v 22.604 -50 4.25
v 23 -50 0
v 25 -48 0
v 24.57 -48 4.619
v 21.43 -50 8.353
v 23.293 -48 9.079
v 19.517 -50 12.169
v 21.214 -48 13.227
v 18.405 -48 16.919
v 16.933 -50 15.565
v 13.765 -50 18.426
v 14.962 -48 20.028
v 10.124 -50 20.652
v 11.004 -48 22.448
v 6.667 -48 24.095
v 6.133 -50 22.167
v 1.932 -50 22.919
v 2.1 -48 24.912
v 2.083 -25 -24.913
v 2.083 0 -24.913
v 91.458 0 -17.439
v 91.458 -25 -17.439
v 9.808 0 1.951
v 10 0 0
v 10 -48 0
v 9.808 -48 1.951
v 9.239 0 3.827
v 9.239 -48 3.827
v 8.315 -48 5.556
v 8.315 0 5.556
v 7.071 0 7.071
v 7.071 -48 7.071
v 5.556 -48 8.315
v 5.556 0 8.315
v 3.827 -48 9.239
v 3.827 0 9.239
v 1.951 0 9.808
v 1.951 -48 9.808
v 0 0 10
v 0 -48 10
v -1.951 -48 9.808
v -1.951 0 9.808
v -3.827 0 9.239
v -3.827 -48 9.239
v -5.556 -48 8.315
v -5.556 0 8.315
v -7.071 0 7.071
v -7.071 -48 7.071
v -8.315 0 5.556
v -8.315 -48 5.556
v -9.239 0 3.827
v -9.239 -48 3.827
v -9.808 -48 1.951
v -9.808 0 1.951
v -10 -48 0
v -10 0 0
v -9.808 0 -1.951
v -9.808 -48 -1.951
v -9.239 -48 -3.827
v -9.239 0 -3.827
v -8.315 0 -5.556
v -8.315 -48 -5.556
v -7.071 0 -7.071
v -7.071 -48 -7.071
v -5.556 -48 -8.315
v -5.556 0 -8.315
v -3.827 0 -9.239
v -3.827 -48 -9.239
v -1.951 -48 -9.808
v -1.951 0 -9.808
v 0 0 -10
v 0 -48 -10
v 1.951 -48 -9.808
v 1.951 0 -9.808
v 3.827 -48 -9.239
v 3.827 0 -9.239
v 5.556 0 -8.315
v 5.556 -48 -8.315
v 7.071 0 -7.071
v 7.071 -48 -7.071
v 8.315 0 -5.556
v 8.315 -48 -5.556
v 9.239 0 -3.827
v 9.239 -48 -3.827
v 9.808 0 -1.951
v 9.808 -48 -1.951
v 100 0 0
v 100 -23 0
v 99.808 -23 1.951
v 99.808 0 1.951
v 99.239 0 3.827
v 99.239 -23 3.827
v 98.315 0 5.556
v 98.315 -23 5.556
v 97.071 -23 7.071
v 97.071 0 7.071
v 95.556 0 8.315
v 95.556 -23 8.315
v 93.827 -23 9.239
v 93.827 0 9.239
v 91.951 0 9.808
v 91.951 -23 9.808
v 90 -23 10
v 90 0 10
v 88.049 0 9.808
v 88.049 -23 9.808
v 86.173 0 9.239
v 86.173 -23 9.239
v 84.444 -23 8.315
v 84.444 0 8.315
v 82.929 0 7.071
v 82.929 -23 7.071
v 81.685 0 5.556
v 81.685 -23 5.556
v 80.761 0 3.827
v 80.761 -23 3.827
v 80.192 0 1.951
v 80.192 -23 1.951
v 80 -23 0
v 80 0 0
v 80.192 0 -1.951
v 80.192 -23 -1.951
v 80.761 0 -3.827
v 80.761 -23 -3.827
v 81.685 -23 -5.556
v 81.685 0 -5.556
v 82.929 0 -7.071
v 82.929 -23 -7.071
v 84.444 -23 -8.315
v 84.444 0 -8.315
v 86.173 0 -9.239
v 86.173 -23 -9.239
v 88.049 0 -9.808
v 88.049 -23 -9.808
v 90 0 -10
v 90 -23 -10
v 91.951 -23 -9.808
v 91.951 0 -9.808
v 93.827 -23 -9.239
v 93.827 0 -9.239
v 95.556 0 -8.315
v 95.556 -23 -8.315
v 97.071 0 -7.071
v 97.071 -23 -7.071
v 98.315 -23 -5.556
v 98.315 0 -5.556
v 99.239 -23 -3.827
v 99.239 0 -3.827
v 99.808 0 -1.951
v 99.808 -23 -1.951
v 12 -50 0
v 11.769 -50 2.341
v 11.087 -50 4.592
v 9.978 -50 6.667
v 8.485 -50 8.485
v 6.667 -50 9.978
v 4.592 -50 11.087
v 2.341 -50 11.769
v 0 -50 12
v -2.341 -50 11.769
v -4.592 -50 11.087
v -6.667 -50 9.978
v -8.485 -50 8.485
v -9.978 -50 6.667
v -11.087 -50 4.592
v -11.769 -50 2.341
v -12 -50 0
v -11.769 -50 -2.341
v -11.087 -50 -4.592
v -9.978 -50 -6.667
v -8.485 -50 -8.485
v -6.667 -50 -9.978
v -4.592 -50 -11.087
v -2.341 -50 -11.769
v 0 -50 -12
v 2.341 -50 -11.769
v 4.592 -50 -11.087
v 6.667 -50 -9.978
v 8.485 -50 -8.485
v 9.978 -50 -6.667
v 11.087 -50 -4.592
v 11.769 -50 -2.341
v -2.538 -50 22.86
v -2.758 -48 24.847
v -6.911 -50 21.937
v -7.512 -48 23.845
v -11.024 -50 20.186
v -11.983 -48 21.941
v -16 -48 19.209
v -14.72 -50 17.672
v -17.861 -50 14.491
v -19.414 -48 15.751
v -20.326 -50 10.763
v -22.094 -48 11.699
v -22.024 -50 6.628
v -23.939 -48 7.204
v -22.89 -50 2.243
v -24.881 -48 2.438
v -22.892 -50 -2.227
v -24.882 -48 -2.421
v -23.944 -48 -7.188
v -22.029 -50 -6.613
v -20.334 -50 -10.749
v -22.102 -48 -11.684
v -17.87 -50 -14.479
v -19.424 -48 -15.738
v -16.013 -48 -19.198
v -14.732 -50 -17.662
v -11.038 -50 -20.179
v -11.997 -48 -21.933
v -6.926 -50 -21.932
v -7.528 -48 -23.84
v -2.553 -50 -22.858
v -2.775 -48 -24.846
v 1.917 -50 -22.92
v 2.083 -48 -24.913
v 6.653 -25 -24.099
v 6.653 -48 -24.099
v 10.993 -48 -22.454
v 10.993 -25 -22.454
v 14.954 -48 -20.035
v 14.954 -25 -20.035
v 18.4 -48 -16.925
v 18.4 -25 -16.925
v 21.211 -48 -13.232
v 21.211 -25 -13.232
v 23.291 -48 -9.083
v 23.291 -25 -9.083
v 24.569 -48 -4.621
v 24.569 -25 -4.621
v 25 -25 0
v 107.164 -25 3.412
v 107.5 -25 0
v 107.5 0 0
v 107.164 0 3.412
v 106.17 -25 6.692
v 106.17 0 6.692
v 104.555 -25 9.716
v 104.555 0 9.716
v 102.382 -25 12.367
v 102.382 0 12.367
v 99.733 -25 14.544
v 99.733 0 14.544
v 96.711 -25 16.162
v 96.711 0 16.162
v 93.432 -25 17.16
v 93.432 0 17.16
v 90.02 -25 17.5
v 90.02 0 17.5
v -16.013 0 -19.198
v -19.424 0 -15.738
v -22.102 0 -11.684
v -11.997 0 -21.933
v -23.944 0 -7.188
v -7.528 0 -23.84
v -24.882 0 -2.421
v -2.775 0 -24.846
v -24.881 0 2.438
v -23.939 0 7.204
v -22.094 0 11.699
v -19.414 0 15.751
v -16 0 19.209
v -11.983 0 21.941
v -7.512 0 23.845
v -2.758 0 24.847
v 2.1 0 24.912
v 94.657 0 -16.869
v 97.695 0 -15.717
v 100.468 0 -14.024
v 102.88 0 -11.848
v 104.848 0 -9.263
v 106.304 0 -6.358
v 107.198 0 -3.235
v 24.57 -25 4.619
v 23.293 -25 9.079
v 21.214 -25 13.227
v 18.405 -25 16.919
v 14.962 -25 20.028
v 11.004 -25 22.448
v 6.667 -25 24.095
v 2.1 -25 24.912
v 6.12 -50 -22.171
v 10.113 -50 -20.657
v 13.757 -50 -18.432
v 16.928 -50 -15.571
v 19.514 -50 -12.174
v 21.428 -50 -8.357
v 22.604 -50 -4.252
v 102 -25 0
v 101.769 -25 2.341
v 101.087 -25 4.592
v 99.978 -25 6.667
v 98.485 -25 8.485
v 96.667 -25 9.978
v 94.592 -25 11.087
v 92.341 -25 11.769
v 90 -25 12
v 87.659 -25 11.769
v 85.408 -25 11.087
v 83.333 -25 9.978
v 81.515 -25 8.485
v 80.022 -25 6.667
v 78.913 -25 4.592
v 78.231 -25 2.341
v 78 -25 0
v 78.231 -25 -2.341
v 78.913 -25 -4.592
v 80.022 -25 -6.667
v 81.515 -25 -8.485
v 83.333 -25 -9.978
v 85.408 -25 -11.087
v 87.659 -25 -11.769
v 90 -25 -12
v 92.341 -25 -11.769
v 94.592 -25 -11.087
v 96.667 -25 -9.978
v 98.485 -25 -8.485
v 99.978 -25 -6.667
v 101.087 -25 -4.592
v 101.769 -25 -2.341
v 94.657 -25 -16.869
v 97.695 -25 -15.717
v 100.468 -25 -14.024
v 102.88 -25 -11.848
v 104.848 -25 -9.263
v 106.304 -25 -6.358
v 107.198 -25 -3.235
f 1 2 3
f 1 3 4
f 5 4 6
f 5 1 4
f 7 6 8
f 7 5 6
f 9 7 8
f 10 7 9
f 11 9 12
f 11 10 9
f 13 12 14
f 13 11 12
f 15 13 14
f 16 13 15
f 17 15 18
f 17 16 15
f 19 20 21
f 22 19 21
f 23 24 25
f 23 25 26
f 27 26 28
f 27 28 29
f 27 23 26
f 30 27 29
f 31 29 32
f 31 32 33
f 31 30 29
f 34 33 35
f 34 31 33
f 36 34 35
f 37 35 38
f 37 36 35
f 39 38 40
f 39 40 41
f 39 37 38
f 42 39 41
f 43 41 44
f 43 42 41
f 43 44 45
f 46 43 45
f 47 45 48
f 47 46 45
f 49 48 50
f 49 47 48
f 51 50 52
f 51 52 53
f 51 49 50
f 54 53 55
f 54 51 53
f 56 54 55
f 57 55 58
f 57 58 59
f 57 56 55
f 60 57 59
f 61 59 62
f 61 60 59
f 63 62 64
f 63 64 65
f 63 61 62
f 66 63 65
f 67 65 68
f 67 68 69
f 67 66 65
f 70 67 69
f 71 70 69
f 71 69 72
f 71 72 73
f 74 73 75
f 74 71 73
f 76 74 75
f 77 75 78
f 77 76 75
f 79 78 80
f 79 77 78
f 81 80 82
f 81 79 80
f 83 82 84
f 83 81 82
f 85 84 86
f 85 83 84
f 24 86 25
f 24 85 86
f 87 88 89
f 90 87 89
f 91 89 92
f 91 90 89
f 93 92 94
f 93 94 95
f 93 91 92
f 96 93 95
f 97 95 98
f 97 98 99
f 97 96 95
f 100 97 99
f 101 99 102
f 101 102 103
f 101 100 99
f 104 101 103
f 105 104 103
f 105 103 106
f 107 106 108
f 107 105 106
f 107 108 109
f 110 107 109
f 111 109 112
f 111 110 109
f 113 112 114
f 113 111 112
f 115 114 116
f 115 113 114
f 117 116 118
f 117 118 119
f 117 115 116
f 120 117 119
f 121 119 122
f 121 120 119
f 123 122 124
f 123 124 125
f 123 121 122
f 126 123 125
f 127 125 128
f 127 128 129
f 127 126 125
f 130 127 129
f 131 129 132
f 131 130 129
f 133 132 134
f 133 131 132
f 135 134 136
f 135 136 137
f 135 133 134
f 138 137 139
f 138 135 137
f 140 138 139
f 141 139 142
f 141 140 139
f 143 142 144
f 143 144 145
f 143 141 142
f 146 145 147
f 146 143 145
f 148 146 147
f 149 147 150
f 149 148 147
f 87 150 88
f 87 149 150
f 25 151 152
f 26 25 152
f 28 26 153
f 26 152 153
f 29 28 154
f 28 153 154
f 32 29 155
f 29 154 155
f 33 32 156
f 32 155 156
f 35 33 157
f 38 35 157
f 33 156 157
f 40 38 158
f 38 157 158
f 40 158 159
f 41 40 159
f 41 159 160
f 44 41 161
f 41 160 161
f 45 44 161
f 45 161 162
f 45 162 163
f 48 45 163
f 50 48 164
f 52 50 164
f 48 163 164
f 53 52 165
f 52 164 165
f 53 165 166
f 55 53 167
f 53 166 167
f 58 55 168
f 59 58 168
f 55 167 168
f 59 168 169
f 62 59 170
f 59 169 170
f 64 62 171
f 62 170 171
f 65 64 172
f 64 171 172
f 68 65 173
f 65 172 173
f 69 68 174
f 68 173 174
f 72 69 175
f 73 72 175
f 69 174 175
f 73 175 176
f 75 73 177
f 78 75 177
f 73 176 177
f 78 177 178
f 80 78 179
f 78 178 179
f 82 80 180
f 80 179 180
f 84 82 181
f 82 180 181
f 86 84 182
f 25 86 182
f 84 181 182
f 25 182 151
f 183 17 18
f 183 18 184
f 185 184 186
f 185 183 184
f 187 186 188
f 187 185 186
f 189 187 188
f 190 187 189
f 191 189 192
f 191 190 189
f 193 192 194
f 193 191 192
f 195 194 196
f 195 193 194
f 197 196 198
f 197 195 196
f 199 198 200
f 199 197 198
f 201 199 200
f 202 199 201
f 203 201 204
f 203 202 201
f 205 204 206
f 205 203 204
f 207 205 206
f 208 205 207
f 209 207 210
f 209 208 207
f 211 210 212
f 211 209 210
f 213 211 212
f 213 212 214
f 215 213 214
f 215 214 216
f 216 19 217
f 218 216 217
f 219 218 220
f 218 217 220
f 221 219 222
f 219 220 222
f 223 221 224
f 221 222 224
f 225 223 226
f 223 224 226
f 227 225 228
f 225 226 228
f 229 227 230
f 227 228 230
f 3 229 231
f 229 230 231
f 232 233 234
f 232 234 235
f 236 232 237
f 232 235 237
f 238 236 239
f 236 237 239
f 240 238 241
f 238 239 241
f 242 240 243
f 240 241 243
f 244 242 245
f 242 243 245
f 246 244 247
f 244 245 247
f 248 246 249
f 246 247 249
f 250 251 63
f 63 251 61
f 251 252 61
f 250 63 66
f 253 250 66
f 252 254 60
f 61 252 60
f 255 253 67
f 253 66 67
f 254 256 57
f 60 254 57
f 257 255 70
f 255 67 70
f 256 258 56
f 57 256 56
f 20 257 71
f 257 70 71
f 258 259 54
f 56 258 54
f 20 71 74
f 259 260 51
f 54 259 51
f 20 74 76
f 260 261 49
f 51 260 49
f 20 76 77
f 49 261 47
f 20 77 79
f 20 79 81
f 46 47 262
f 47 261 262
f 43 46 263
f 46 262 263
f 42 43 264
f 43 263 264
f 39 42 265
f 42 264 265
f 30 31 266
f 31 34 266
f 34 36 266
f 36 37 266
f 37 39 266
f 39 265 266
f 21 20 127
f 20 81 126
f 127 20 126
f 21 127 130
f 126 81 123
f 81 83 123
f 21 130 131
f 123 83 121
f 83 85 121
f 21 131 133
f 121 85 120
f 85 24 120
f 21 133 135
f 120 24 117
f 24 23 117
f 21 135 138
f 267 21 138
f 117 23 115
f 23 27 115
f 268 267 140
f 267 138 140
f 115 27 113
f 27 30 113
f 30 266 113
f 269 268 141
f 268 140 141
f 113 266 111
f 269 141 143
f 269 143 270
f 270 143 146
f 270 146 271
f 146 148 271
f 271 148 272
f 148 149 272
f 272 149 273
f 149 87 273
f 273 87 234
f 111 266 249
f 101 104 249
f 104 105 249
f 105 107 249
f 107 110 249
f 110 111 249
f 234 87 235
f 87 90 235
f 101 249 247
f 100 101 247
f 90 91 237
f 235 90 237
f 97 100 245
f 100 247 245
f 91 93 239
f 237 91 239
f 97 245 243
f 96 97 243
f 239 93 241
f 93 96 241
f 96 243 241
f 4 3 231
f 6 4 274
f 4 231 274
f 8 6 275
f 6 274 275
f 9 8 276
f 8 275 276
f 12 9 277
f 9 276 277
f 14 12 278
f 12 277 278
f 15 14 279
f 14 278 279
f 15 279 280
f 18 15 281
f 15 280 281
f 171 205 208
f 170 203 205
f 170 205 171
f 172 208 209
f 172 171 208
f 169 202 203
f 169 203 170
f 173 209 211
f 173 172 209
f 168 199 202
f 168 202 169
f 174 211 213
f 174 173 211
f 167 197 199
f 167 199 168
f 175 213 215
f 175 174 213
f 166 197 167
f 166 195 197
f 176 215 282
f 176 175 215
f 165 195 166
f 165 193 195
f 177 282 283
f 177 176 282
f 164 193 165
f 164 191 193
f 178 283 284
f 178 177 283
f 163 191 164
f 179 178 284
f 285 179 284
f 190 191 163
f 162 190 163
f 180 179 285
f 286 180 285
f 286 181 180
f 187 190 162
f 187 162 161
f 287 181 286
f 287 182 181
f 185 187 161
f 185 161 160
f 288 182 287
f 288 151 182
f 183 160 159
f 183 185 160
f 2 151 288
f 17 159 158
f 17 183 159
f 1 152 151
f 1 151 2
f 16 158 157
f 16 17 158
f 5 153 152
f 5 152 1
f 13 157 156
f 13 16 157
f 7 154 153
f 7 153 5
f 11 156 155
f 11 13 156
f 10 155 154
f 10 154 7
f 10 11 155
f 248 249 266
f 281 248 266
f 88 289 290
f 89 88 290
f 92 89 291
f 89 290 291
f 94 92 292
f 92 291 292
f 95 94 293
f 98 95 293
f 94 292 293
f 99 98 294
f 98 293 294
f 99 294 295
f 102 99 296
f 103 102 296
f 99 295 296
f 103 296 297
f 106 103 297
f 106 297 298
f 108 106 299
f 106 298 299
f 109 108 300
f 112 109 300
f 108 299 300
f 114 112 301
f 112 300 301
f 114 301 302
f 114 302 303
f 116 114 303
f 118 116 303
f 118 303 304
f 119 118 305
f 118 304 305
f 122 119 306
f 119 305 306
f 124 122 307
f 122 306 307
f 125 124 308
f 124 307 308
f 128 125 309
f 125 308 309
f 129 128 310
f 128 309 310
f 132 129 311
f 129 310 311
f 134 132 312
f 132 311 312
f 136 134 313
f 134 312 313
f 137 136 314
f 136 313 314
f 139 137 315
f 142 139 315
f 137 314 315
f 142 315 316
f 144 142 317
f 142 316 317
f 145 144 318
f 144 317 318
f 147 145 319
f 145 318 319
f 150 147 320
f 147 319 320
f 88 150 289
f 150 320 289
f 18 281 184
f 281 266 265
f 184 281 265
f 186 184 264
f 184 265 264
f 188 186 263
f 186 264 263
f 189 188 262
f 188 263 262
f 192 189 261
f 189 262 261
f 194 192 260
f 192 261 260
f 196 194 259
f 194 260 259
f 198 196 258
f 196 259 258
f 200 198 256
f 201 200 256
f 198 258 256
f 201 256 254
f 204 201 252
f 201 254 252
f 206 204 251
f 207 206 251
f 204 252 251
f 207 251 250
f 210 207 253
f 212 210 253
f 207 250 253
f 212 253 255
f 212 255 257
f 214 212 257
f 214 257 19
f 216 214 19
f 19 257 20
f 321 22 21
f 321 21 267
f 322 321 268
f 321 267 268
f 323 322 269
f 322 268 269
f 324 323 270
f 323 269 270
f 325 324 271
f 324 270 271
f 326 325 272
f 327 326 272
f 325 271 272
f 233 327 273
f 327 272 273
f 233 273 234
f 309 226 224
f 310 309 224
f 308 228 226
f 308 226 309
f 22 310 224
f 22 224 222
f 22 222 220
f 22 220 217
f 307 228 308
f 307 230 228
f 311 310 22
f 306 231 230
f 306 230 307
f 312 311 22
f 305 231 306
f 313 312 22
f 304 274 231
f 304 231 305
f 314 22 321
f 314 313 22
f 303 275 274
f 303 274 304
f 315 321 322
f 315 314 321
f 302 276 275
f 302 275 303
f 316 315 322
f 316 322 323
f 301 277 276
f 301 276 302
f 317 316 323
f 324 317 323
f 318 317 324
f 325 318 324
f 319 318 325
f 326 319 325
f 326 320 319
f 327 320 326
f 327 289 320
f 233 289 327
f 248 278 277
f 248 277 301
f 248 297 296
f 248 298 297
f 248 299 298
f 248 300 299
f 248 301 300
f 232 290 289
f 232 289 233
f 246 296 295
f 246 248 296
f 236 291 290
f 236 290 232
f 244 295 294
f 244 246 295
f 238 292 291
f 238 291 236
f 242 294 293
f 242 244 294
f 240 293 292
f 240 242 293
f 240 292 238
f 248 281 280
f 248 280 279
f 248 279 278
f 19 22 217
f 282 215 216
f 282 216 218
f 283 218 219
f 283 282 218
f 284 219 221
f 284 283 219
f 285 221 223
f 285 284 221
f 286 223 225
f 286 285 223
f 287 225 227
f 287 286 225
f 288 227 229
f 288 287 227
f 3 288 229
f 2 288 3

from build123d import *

# Parameters (mm, degrees)
F0_R     = 10
F1_DEPTH = 25
F2_R     = 10
F3_DEPTH = 50
F4_SIZE  = 2


with BuildPart() as f1:
    # F0 (on Front) → F1 (new body)
    with BuildSketch(Plane.XZ):
        with BuildLine():
            ThreePointArc((2.100041, 24.91164), (-24.999999, 0.008383), (2.083333, -24.913043))
            ThreePointArc((2.083333, -24.913043), (18.399502, -16.92508), (25, 0))
            ThreePointArc((25, 0), (18.405176, 16.918909), (2.100041, 24.91164))
        make_face()
        Circle(F0_R, mode=Mode.SUBTRACT)
        with BuildLine():
            ThreePointArc((25, 0), (18.399502, -16.92508), (2.083333, -24.913043))
            Line((2.083333, -24.913043), (91.458333, -17.43913))
            ThreePointArc((91.458333, -17.43913), (72.514802, -0.71961), (90.020401, 17.499988))
            Line((90.020401, 17.499988), (2.100041, 24.91164))
            ThreePointArc((2.100041, 24.91164), (18.405176, 16.918909), (25, 0))
        make_face()
        with BuildLine():
            ThreePointArc((90.020401, 17.499988), (72.514802, -0.71961), (91.458333, -17.43913))
            ThreePointArc((91.458333, -17.43913), (102.879651, -11.847556), (107.5, 0))
            ThreePointArc((107.5, 0), (102.381579, 12.367154), (90.020401, 17.499988))
        make_face()
        with Locations((90, 0)):
            Circle(F0_R, mode=Mode.SUBTRACT)
    extrude(amount=F1_DEPTH)

    # F2 (on face) → F3 (join)
    with BuildSketch(Plane.XZ):
        with BuildLine():
            ThreePointArc((25, 0), (18.405176, 16.918909), (2.100041, 24.91164))
            ThreePointArc((2.100041, 24.91164), (-24.999999, 0.008383), (2.083333, -24.913043))
            ThreePointArc((2.083333, -24.913043), (18.399502, -16.92508), (25, 0))
        make_face()
        Circle(F2_R, mode=Mode.SUBTRACT)
    extrude(amount=F3_DEPTH)

    # F4
    f4_edges = [f1.edges().sort_by_distance(p)[0] for p in [
        (-2.083333, -50, 24.913043),
        (-10, -50, 0),
        (80, -25, 0),
    ]]
    chamfer(f4_edges, length=F4_SIZE)


solid = f1.part
